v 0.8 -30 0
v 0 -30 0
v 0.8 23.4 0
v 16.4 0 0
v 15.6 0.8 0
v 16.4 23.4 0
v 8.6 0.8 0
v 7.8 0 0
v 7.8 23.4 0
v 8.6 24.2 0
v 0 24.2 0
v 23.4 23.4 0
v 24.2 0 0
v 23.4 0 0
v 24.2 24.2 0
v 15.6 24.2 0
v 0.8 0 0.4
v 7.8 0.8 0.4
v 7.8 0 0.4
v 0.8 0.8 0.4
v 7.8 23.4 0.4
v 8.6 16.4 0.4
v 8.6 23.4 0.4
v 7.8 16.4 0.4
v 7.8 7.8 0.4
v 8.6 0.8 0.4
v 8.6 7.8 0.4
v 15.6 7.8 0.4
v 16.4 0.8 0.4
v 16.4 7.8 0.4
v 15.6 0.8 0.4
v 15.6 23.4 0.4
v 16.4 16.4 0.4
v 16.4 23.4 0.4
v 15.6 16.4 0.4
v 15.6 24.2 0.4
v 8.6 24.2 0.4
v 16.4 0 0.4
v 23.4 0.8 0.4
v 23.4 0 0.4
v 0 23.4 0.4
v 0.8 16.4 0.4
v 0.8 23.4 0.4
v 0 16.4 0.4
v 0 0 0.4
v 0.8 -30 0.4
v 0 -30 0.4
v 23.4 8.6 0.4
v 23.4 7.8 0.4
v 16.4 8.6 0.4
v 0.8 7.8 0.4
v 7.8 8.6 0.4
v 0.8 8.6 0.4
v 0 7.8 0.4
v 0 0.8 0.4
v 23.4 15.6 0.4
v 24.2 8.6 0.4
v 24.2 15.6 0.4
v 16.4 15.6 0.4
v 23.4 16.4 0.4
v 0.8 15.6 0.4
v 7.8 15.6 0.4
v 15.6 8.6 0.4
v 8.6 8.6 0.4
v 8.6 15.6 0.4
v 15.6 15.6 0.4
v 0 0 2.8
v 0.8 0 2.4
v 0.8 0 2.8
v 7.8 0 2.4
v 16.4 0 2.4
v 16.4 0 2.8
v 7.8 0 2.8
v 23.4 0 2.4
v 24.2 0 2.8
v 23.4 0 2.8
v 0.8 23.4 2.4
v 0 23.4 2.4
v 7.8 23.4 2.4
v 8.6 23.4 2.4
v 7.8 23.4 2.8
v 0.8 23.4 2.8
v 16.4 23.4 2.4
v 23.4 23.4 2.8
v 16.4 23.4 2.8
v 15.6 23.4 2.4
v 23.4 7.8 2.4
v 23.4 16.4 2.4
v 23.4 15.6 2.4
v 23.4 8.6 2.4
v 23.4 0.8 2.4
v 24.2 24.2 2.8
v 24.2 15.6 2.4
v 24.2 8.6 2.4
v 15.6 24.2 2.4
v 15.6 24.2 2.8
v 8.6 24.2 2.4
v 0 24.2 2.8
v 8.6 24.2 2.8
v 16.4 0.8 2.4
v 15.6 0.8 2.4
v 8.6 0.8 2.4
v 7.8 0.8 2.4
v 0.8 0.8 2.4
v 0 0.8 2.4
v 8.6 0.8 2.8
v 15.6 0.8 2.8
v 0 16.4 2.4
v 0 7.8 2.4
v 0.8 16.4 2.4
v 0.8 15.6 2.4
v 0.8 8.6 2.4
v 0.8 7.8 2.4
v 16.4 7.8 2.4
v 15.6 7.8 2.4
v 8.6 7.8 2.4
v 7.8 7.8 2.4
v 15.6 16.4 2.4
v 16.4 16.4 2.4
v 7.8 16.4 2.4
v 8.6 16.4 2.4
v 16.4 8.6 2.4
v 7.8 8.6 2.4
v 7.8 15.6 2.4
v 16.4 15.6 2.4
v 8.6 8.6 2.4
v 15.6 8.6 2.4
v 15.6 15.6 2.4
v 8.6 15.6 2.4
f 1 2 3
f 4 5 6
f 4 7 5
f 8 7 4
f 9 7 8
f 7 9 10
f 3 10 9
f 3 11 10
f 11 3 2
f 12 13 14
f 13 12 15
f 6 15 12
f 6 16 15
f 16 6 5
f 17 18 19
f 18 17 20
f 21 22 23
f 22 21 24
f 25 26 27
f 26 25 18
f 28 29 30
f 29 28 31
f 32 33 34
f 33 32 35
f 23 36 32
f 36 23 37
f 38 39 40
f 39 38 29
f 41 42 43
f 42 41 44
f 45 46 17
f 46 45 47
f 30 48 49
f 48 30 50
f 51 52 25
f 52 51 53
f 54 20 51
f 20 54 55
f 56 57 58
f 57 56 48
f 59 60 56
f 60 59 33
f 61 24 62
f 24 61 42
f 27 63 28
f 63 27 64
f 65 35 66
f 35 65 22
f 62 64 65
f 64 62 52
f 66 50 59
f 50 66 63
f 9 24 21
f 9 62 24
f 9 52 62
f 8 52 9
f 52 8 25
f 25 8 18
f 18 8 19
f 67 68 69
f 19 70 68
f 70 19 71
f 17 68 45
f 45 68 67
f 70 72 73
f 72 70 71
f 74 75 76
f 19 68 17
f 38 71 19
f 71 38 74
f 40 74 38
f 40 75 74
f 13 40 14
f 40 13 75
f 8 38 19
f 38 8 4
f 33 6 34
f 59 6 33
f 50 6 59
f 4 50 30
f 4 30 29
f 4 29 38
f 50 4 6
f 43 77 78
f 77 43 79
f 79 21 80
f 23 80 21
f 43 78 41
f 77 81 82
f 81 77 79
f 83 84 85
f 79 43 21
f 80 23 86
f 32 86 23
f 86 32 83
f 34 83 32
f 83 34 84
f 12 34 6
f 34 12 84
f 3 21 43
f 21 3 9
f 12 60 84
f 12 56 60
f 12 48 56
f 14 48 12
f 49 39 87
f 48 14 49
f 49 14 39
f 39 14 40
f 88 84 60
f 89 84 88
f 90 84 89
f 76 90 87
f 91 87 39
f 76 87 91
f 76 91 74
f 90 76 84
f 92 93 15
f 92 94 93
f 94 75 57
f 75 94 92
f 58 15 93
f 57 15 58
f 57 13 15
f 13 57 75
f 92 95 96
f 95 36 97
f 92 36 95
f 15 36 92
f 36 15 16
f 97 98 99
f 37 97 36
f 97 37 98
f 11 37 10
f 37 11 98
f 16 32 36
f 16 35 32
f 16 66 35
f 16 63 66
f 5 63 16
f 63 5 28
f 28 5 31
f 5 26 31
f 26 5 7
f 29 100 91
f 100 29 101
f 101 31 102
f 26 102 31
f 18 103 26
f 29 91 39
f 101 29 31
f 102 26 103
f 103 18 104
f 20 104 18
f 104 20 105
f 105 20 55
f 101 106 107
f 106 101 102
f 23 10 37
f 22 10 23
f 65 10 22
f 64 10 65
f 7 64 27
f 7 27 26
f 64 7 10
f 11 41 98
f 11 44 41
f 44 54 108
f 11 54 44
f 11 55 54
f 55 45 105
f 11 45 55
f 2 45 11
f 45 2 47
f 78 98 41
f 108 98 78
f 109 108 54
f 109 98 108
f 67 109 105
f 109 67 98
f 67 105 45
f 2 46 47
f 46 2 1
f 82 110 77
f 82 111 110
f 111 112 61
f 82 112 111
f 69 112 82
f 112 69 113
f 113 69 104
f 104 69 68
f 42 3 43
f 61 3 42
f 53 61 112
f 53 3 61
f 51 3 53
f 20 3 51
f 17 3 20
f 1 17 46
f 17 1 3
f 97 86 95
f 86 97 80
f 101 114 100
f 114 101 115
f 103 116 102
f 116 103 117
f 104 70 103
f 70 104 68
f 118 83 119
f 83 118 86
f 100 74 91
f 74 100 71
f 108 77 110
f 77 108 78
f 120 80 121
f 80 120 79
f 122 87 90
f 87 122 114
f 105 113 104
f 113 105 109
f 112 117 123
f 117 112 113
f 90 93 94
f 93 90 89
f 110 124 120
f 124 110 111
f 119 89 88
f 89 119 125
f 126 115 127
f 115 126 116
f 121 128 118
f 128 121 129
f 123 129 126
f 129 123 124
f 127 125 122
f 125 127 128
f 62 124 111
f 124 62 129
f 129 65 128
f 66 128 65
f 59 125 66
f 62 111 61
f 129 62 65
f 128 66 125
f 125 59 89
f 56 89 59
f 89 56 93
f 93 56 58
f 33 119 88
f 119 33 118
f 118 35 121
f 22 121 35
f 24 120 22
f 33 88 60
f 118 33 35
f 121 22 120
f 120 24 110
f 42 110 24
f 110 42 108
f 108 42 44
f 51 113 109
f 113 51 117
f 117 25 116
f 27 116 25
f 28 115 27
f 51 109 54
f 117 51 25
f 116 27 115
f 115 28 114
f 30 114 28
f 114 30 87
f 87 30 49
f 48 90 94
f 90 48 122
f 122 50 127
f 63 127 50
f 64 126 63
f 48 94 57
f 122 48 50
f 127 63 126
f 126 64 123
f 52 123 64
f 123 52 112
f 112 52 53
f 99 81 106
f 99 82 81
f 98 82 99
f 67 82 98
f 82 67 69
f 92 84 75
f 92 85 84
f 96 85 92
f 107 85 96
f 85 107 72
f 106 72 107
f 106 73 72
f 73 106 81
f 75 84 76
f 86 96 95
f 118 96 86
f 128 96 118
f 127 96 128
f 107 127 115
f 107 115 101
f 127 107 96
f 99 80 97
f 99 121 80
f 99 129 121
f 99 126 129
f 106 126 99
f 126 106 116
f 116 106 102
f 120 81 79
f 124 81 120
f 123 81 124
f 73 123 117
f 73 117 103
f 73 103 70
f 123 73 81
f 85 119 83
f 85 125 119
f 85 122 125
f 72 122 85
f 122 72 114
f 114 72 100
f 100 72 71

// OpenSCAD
// file: ../../api/v3/reporting.scad
//////////////////////////////////////////////////////////////////////
// LibFile: reporting.scad
// Project: Grid Stack
// FileGroup: API v3 Reporting
// FileSummary: Console report for immutable direct and positive-gap coupons.
// Role: Records the exact environment, dimensions, support strategy, path
//       lengths, qualification status, and deposited-layer counts.
// Requires: API v3 indexes, mathematics, and path generator.
// Exports: report_structural_coupon_object().
//////////////////////////////////////////////////////////////////////

function _bridge_status3(span, process) =
    span <= process[PX3_BRIDGE_MAX]
        ? "within_owner_tested_limit"
        : "exploratory_beyond_owner_tested_limit";

module report_structural_coupon_object(object, report_level = "full") {
    material = object[SCO_MATERIAL];
    nozzle = object[SCO_NOZZLE];
    printer = object[SCO_PRINTER];
    process = object[SCO_PROCESS];
    boundary = object[SCO_BOUNDARY];
    gap = object[SCO_CLEAR_GAP];
    strategy = object[SCO_SUPPORT_STRATEGY];

    echo("--- Grid Stack immutable structural coupon ---");
    echo(str("Object: ", object[SCO_NAME], " revision ", object[SCO_REVISION]));
    echo(str("API/schema: ", object[SCO_REQUIRED_API], "/",
        object[SCO_SCHEMA_VERSION]));
    echo(str("Release/base commit: ", object[SCO_SOURCE_RELEASE], " / ",
        object[SCO_FRAMEWORK_BASE_COMMIT]));
    echo(str("Material/nozzle/printer: ", material[MAT3_FAMILY], " / ",
        nozzle[NZ3_DIAMETER], " mm / ", printer[PRN3_NAME]));
    echo(str("Cells: ", boundary[B3_CELLS_X], " x ", boundary[B3_CELLS_Y]));
    echo(str("Clear spans: ", boundary[B3_CLEAR_SPAN_X], " x ",
        boundary[B3_CLEAR_SPAN_Y], " mm"));
    echo(str("Span status: ",
        _bridge_status3(boundary[B3_CLEAR_SPAN_X], process)));
    echo(str("Outside size: ", boundary_size_x3(boundary, process, nozzle),
        " x ", boundary_size_y3(boundary, process, nozzle), " mm"));
    echo(str("Primitive trace: ", trace_width3(nozzle), " x ",
        trace_height3(process), " mm"));
    echo(str("Structural strand: ", strand_width3(process, nozzle), " x ",
        strand_height3(process), " mm"));
    echo(str("Clear vertical gap: ", gap, " mm"));
    echo(str("Support strategy: ", strategy));
    echo(str("Total modeled height: ", coupon_total_height3(object), " mm"));

    if (report_level == "full") {
        if (strategy == "direct_orthogonal") {
            lower = coupon_path(
                boundary, process, nozzle, 0, object[SCO_LEAD_IN]
            );
            upper = coupon_path(boundary, process, nozzle, 90, 0);
            echo(str("Lower/upper path lengths: ", path_length3(lower),
                " / ", path_length3(upper), " mm"));
            echo(str("Deposited layers: ", 2 * process[PX3_HEIGHT_PASSES]));
        }
        else {
            witness = coupon_path(
                boundary, process, nozzle, 90, object[SCO_LEAD_IN]
            );
            riser = coupon_path(boundary, process, nozzle, 0, 0);
            test = coupon_path(boundary, process, nozzle, 90, 0);
            echo(str("Witness/riser/test path lengths: ",
                path_length3(witness), " / ", path_length3(riser), " / ",
                path_length3(test), " mm"));
            echo(str("Riser deposited layers: ", round(gap_layer_count3(object))));
            echo(str("Total deposited layers: ",
                2 * process[PX3_HEIGHT_PASSES] +
                round(gap_layer_count3(object))));
        }
        echo(str("Status: ", object[SCO_STATUS]));
        echo(str("Notes: ", object[SCO_NOTES]));
    }
}
// file: ../../api/v3/validation.scad
//////////////////////////////////////////////////////////////////////
// LibFile: validation.scad
// Project: Grid Stack
// FileGroup: API v3 Validation
// FileSummary: Validates immutable environment records, count boundaries,
//              support strategy, path continuity, and layer quantization.
// Role: Rejects incompatible or physically floating recipes before geometry
//       is generated.
// Requires: API v3 indexes, mathematics, and path generator.
// Exports: validate_structural_coupon_object().
//////////////////////////////////////////////////////////////////////

module _validate_path3(points, boundary, orientation, lead_in) {
    run_count = orientation == 0
        ? boundary_strand_count_y3(boundary)
        : boundary_strand_count_x3(boundary);

    assert(len(points) == expected_coupon_point_count3(run_count, lead_in),
        "API v3 coupon path has an unexpected point count.");
    assert(!path_has_zero_segment3(points),
        "API v3 coupon path contains a zero-length segment.");
    assert(path_axis_aligned3(points),
        "API v3 coupon path must remain axis-aligned.");
    assert(points[0] != points[len(points) - 1],
        "API v3 coupon path must remain open.");
}

module validate_structural_coupon_object(object) {
    assert(object[SCO_REQUIRED_API] == GRID_STACK_API_VERSION,
        "Saved coupon requires a different Grid Stack API version.");
    assert(object[SCO_SCHEMA_VERSION] == GRID_STACK_COUPON_SCHEMA_VERSION,
        "Saved coupon requires a different coupon schema version.");
    assert(GRID_STACK_RECTANGULAR_FRAMEWORK_VERSION == 2,
        "Saved coupon requires rectangular framework version 2.");

    material = object[SCO_MATERIAL];
    nozzle = object[SCO_NOZZLE];
    printer = object[SCO_PRINTER];
    process = object[SCO_PROCESS];
    boundary = object[SCO_BOUNDARY];
    gap = object[SCO_CLEAR_GAP];
    lead_in = object[SCO_LEAD_IN];
    strategy = object[SCO_SUPPORT_STRATEGY];

    assert(nozzle[NZ3_DIAMETER] > 0,
        "Saved coupon nozzle diameter must be positive.");
    assert(process[PX3_LAYER_H] > 0,
        "Saved coupon layer height must be positive.");
    assert(process[PX3_WIDTH_PASSES] >= 2,
        "Saved coupon structural width requires at least two passes.");
    assert(process[PX3_HEIGHT_PASSES] >= 2,
        "Saved coupon structural height requires at least two layers.");
    assert(process[PX3_MATERIAL] == material[MAT3_NAME],
        "Saved coupon process/material references do not match.");
    assert(process[PX3_NOZZLE] == nozzle[NZ3_NAME],
        "Saved coupon process/nozzle references do not match.");
    assert(process[PX3_PRINTER] == printer[PRN3_NAME],
        "Saved coupon process/printer references do not match.");
    assert(boundary[B3_CELLS_X] > 0 && boundary[B3_CELLS_Y] > 0,
        "Saved coupon cell counts must be positive.");
    assert(boundary[B3_CLEAR_SPAN_X] > 0 &&
           boundary[B3_CLEAR_SPAN_Y] > 0,
        "Saved coupon clear spans must be positive.");
    assert(lead_in >= 0,
        "Saved coupon lead-in cannot be negative.");
    assert(gap >= 0,
        "Saved coupon clear gap cannot be negative.");
    assert(nearly_equal3(gap_layer_count3(object), round(gap_layer_count3(object))),
        "Saved coupon clear gap must equal a whole deposited-layer count.");
    assert(
        (strategy == "direct_orthogonal" && nearly_equal3(gap, 0)) ||
        (strategy == "witness_riser_bridge" && gap > 0),
        "Saved coupon support strategy does not match its clear gap."
    );

    if (strategy == "direct_orthogonal") {
        lower = coupon_path(boundary, process, nozzle, 0, lead_in);
        upper = coupon_path(boundary, process, nozzle, 90, 0);
        _validate_path3(lower, boundary, 0, lead_in);
        _validate_path3(upper, boundary, 90, 0);
        entry = lead_in > 0 ? 1 : 0;
        assert(nearly_equal3(point_distance_2d3(lower[entry], upper[0]), 0),
            "Direct upper path must start on the lower entry crossing.");
    }
    else {
        witness = coupon_path(boundary, process, nozzle, 90, lead_in);
        riser = coupon_path(boundary, process, nozzle, 0, 0);
        test = coupon_path(boundary, process, nozzle, 90, 0);
        _validate_path3(witness, boundary, 90, lead_in);
        _validate_path3(riser, boundary, 0, 0);
        _validate_path3(test, boundary, 90, 0);
        entry = lead_in > 0 ? 1 : 0;
        assert(nearly_equal3(point_distance_2d3(witness[entry], riser[0]), 0),
            "Riser path must start on the witness entry crossing.");
        assert(nearly_equal3(point_distance_2d3(riser[0], test[0]), 0),
            "Upper test path must start on the riser entry crossing.");
        for (i = [0 : len(test) - 1])
            assert(nearly_equal3(point_distance_2d3(test[i], witness[i + entry]), 0),
                "Upper test path must align directly above the witness path.");
    }

    echo("GRID STACK API V3 COUPON VALIDATION: PASS");
}
// file: ../../api/v3/geometry.scad
//////////////////////////////////////////////////////////////////////
// LibFile: geometry.scad
// Project: Grid Stack
// FileGroup: API v3 Printable Geometry
// FileSummary: Creates square-ended structural paths, direct-contact coupons,
//              positive witness/riser/bridge coupons, and simple diagnostics.
// Role: Supplies all geometry used by immutable API v3 recipes without
//       importing mutable workbench geometry.
// Requires: API v3 mathematics and ordered axis-aligned paths.
// Exports: render_direct_coupon(), render_positive_gap_coupon(), and
//          render_coupon_path_debug().
//////////////////////////////////////////////////////////////////////

module _segment_2d3(a, b, width) {
    horizontal = nearly_equal3(a[1], b[1]);
    vertical = nearly_equal3(a[0], b[0]);

    assert(horizontal || vertical,
        "API v3 printable segments must be horizontal or vertical.");
    assert(!nearly_equal3(point_distance_2d3(a, b), 0),
        "API v3 printable segments must have nonzero length.");

    if (horizontal)
        translate([min(a[0], b[0]) - width / 2, a[1] - width / 2])
            square([abs(b[0] - a[0]) + width, width]);
    else
        translate([a[0] - width / 2, min(a[1], b[1]) - width / 2])
            square([width, abs(b[1] - a[1]) + width]);
}

module _path_2d3(points, width) {
    union()
        for (i = [0 : len(points) - 2])
            _segment_2d3(points[i], points[i + 1], width);
}

module _structural_path3(points, process, nozzle) {
    linear_extrude(height = strand_height3(process), convexity = 10)
        _path_2d3(points, strand_width3(process, nozzle));
}

module render_direct_coupon(lower, upper, process, nozzle) {
    union() {
        _structural_path3(lower, process, nozzle);
        translate([0, 0, strand_height3(process)])
            _structural_path3(upper, process, nozzle);
    }
}

module render_positive_gap_coupon(
    witness, riser, test, process, nozzle, clear_gap
) {
    union() {
        _structural_path3(witness, process, nozzle);

        translate([0, 0, strand_height3(process)])
            linear_extrude(height = clear_gap, convexity = 10)
                _path_2d3(riser, strand_width3(process, nozzle));

        translate([0, 0, strand_height3(process) + clear_gap])
            _structural_path3(test, process, nozzle);
    }
}

module _debug_path3(points, z, width) {
    translate([0, 0, z])
        linear_extrude(height = 0.04)
            _path_2d3(points, width);
}

module render_coupon_path_debug(
    lower, upper, riser, process, clear_gap = 0
) {
    width = max(0.12, trace_height3(process));
    _debug_path3(lower, 0, width);
    if (len(riser) > 0)
        _debug_path3(riser, strand_height3(process), width);
    _debug_path3(
        upper,
        strand_height3(process) + clear_gap,
        width
    );
}
// file: ../../api/v3/paths.scad
//////////////////////////////////////////////////////////////////////
// LibFile: paths.scad
// Project: Grid Stack
// FileGroup: API v3 Path Generation
// FileSummary: Generates one open rectangular serpentine centerline from a
//              count boundary for X- or Y-running structural paths.
// Role: Preserves parallel runs, square connectors, optional single lead-in,
//       and one uninterrupted ordered point list per deposited layer.
// Requires: API v3 indexes and mathematics.
// Exports: coupon_path() and expected_coupon_point_count3().
//////////////////////////////////////////////////////////////////////

function _x_rows3(row, count, x_min, x_max, y_min, pitch) =
    row >= count
        ? []
        : let(
            y = y_min + row * pitch,
            x_end = row % 2 == 0 ? x_max : x_min,
            row_end = [x_end, y],
            connector_end = [x_end, y + pitch]
        )
        concat(
            [row_end],
            row < count - 1 ? [connector_end] : [],
            _x_rows3(row + 1, count, x_min, x_max, y_min, pitch)
        );

function _y_columns3(column, count, x_min, y_min, y_max, pitch) =
    column >= count
        ? []
        : let(
            x = x_min + column * pitch,
            y_end = column % 2 == 0 ? y_max : y_min,
            column_end = [x, y_end],
            connector_end = [x + pitch, y_end]
        )
        concat(
            [column_end],
            column < count - 1 ? [connector_end] : [],
            _y_columns3(column + 1, count, x_min, y_min, y_max, pitch)
        );

function expected_coupon_point_count3(run_count, lead_in = 0) =
    2 * run_count + (lead_in > 0 ? 1 : 0);

function coupon_path(
    boundary, process, nozzle, orientation = 0, lead_in = 0
) =
    assert(orientation == 0 || orientation == 90,
        "API v3 coupon orientation must be 0 or 90 degrees.")
    assert(lead_in >= 0,
        "API v3 coupon lead-in cannot be negative.")
    let(
        width = strand_width3(process, nozzle),
        x_min = width / 2,
        y_min = width / 2,
        x_max = boundary_size_x3(boundary, process, nozzle) - width / 2,
        y_max = boundary_size_y3(boundary, process, nozzle) - width / 2,
        entry = [x_min, y_min],
        prefix = lead_in > 0
            ? (orientation == 0
                ? [[x_min - lead_in, y_min], entry]
                : [[x_min, y_min - lead_in], entry])
            : [entry]
    )
    orientation == 0
        ? concat(
            prefix,
            _x_rows3(
                0, boundary_strand_count_y3(boundary),
                x_min, x_max, y_min,
                boundary_pitch_y3(boundary, process, nozzle)
            )
        )
        : concat(
            prefix,
            _y_columns3(
                0, boundary_strand_count_x3(boundary),
                x_min, y_min, y_max,
                boundary_pitch_x3(boundary, process, nozzle)
            )
        );
// file: ../../api/v3/math.scad
//////////////////////////////////////////////////////////////////////
// LibFile: math.scad
// Project: Grid Stack
// FileGroup: API v3 Mathematics
// FileSummary: Pure trace, strand, boundary, path, and layer-count helpers.
// Role: Keeps API v3 calculations isolated and reproducible without importing
//       mutable workbench mathematics.
// Requires: API v3 indexes.
// Exports: nearly_equal3(), trace/strand dimensions, boundary dimensions,
//          path inspection, gap-layer count, and total-height helpers.
//////////////////////////////////////////////////////////////////////

function nearly_equal3(a, b, epsilon = 0.000001) = abs(a - b) <= epsilon;

function trace_width3(nozzle) = nozzle[NZ3_DIAMETER];
function trace_height3(process) = process[PX3_LAYER_H];
function strand_width3(process, nozzle) =
    trace_width3(nozzle) * process[PX3_WIDTH_PASSES];
function strand_height3(process) =
    trace_height3(process) * process[PX3_HEIGHT_PASSES];

function boundary_strand_count_x3(boundary) = boundary[B3_CELLS_X] + 1;
function boundary_strand_count_y3(boundary) = boundary[B3_CELLS_Y] + 1;
function boundary_pitch_x3(boundary, process, nozzle) =
    boundary[B3_CLEAR_SPAN_X] + strand_width3(process, nozzle);
function boundary_pitch_y3(boundary, process, nozzle) =
    boundary[B3_CLEAR_SPAN_Y] + strand_width3(process, nozzle);
function boundary_size_x3(boundary, process, nozzle) =
    boundary[B3_CELLS_X] * boundary[B3_CLEAR_SPAN_X] +
    boundary_strand_count_x3(boundary) * strand_width3(process, nozzle);
function boundary_size_y3(boundary, process, nozzle) =
    boundary[B3_CELLS_Y] * boundary[B3_CLEAR_SPAN_Y] +
    boundary_strand_count_y3(boundary) * strand_width3(process, nozzle);

function point_distance_2d3(a, b) =
    sqrt(pow(b[0] - a[0], 2) + pow(b[1] - a[1], 2));
function path_length3(points, i = 0) =
    i >= len(points) - 1
        ? 0
        : point_distance_2d3(points[i], points[i + 1]) +
          path_length3(points, i + 1);
function path_has_zero_segment3(points, i = 0) =
    i >= len(points) - 1
        ? false
        : nearly_equal3(point_distance_2d3(points[i], points[i + 1]), 0)
            ? true
            : path_has_zero_segment3(points, i + 1);
function segment_axis_aligned3(a, b) =
    nearly_equal3(a[0], b[0]) || nearly_equal3(a[1], b[1]);
function path_axis_aligned3(points, i = 0) =
    i >= len(points) - 1
        ? true
        : segment_axis_aligned3(points[i], points[i + 1]) &&
          path_axis_aligned3(points, i + 1);

function gap_layer_count3(object) =
    object[SCO_CLEAR_GAP] / trace_height3(object[SCO_PROCESS]);
function coupon_total_height3(object) =
    2 * strand_height3(object[SCO_PROCESS]) + object[SCO_CLEAR_GAP];
// file: ../../api/v3/schema.scad
//////////////////////////////////////////////////////////////////////
// LibFile: schema.scad
// Project: Grid Stack
// FileGroup: API v3 Data Model
// FileSummary: Constructors for self-contained immutable structural coupons.
// Role: Makes every geometry-affecting environment and object value explicit
//       inside the saved recipe rather than resolving mutable catalog names.
// Exports: material_spec(), nozzle_spec(), printer_spec(),
//          structural_process_profile(), count_boundary(), and
//          structural_coupon_object().
//////////////////////////////////////////////////////////////////////

function material_spec(
    name, family, flexibility, status = "in_use", notes = ""
) = [name, family, flexibility, status, notes];

function nozzle_spec(
    name, diameter, construction = "brass", status = "in_use", notes = ""
) = [name, diameter, construction, status, notes];

function printer_spec(
    name,
    manufacturer = "",
    model = "",
    motion_system = "",
    build_surface = "",
    status = "unrecorded",
    notes = ""
) = [
    name, manufacturer, model, motion_system,
    build_surface, status, notes
];

function structural_process_profile(
    name,
    material_name,
    nozzle_name,
    printer_name,
    layer_height,
    width_passes,
    height_passes,
    bridge_max,
    qualification,
    revision,
    notes = ""
) = [
    name, material_name, nozzle_name, printer_name,
    layer_height, width_passes, height_passes, bridge_max,
    qualification, revision, notes
];

// Function: count_boundary()
// Synopsis: Stores clear-opening counts and clear spans for one rectangle.
function count_boundary(
    name,
    cells_x,
    cells_y,
    clear_span_x,
    clear_span_y,
    notes = ""
) = [name, cells_x, cells_y, clear_span_x, clear_span_y, notes];

// Function: structural_coupon_object()
// Synopsis: Constructs one permanent coupon recipe.
// Description:
//   framework_base_commit records the last accepted repository state used to
//   begin the API implementation. The Git commit containing this recipe is the
//   authoritative complete source; a file cannot embed its own future hash.
function structural_coupon_object(
    name,
    revision,
    required_api_version,
    coupon_schema_version,
    source_release,
    framework_base_commit,
    material,
    nozzle,
    printer,
    process,
    boundary,
    clear_vertical_gap,
    lead_in,
    support_strategy,
    status = "calibration",
    notes = ""
) = [
    name,
    revision,
    required_api_version,
    coupon_schema_version,
    source_release,
    framework_base_commit,
    material,
    nozzle,
    printer,
    process,
    boundary,
    clear_vertical_gap,
    lead_in,
    support_strategy,
    status,
    notes
];
// file: ../../api/v3/indices.scad
//////////////////////////////////////////////////////////////////////
// LibFile: indices.scad
// Project: Grid Stack
// FileGroup: API v3 Data Model
// FileSummary: Named indexes for immutable structural-coupon records.
// Role: Prevents unexplained numeric indexes from entering saved recipes and
//       keeps API version 3 independent of mutable workbench indexes.
// Exports: MAT3_*, NZ3_*, PRN3_*, PX3_*, B3_*, and SCO_* constants.
//////////////////////////////////////////////////////////////////////

MAT3_NAME = 0;
MAT3_FAMILY = 1;
MAT3_FLEXIBILITY = 2;
MAT3_STATUS = 3;
MAT3_NOTES = 4;

NZ3_NAME = 0;
NZ3_DIAMETER = 1;
NZ3_CONSTRUCTION = 2;
NZ3_STATUS = 3;
NZ3_NOTES = 4;

PRN3_NAME = 0;
PRN3_MANUFACTURER = 1;
PRN3_MODEL = 2;
PRN3_MOTION_SYSTEM = 3;
PRN3_BUILD_SURFACE = 4;
PRN3_STATUS = 5;
PRN3_NOTES = 6;

PX3_NAME = 0;
PX3_MATERIAL = 1;
PX3_NOZZLE = 2;
PX3_PRINTER = 3;
PX3_LAYER_H = 4;
PX3_WIDTH_PASSES = 5;
PX3_HEIGHT_PASSES = 6;
PX3_BRIDGE_MAX = 7;
PX3_QUALIFICATION = 8;
PX3_REVISION = 9;
PX3_NOTES = 10;

B3_NAME = 0;
B3_CELLS_X = 1;
B3_CELLS_Y = 2;
B3_CLEAR_SPAN_X = 3;
B3_CLEAR_SPAN_Y = 4;
B3_NOTES = 5;

SCO_NAME = 0;
SCO_REVISION = 1;
SCO_REQUIRED_API = 2;
SCO_SCHEMA_VERSION = 3;
SCO_SOURCE_RELEASE = 4;
SCO_FRAMEWORK_BASE_COMMIT = 5;
SCO_MATERIAL = 6;
SCO_NOZZLE = 7;
SCO_PRINTER = 8;
SCO_PROCESS = 9;
SCO_BOUNDARY = 10;
SCO_CLEAR_GAP = 11;
SCO_LEAD_IN = 12;
SCO_SUPPORT_STRATEGY = 13;
SCO_STATUS = 14;
SCO_NOTES = 15;
// file: ../../api/grid_stack_v3.scad
//////////////////////////////////////////////////////////////////////
// LibFile: grid_stack_v3.scad
// Project: Grid Stack
// FileGroup: Versioned Public Interface
// FileSummary: Immutable API version 3 for rectangular count-boundary
//              structural coupons, including positive witness/riser gaps.
// Role: Reconstructs saved coupon recipes without Customizer state or mutable
//       workbench catalogs. Incompatible behavior requires a new API file.
// Exports: API/schema constants, record constructors, validation, reporting,
//          and structural_coupon_render().
//////////////////////////////////////////////////////////////////////

GRID_STACK_API_VERSION = 3;
GRID_STACK_COUPON_SCHEMA_VERSION = 1;
GRID_STACK_RECTANGULAR_FRAMEWORK_VERSION = 2;
GRID_STACK_RELEASE = "1.0.0";

include <v3/indices.scad>
include <v3/schema.scad>
include <v3/math.scad>
include <v3/paths.scad>
include <v3/geometry.scad>
include <v3/validation.scad>
include <v3/reporting.scad>

// Module: structural_coupon_render()
// Synopsis: Validates, reports, and renders one immutable coupon recipe.
// Arguments:
//   object = Record returned by structural_coupon_object().
//   mode = print, path_debug, or report_only.
//   report_level = summary or full.
module structural_coupon_render(
    object,
    mode = "print",
    report_level = "full"
) {
    validate_structural_coupon_object(object);
    report_structural_coupon_object(object, report_level);

    boundary = object[SCO_BOUNDARY];
    process = object[SCO_PROCESS];
    nozzle = object[SCO_NOZZLE];
    lead_in = object[SCO_LEAD_IN];
    clear_gap = object[SCO_CLEAR_GAP];
    strategy = object[SCO_SUPPORT_STRATEGY];

    if (strategy == "direct_orthogonal") {
        lower = coupon_path(boundary, process, nozzle, 0, lead_in);
        upper = coupon_path(boundary, process, nozzle, 90, 0);

        if (mode == "print")
            render_direct_coupon(lower, upper, process, nozzle);
        else if (mode == "path_debug")
            render_coupon_path_debug(lower, upper, [], process);
        else if (mode == "report_only")
            echo("Grid Stack API v3 report-only mode: no geometry generated.");
        else
            assert(false, str("Unknown API v3 render mode: ", mode));
    }
    else if (strategy == "witness_riser_bridge") {
        witness = coupon_path(boundary, process, nozzle, 90, lead_in);
        riser = coupon_path(boundary, process, nozzle, 0, 0);
        test = coupon_path(boundary, process, nozzle, 90, 0);

        if (mode == "print")
            render_positive_gap_coupon(
                witness, riser, test, process, nozzle, clear_gap
            );
        else if (mode == "path_debug")
            render_coupon_path_debug(witness, test, riser, process, clear_gap);
        else if (mode == "report_only")
            echo("Grid Stack API v3 report-only mode: no geometry generated.");
        else
            assert(false, str("Unknown API v3 render mode: ", mode));
    }
    else
        assert(false, str("Unknown coupon support strategy: ", strategy));
}
// main file
//////////////////////////////////////////////////////////////////////
// LibFile: coupon-3x3-span7-gap2-pla-plus-0p4-v1.scad
// Project: Grid Stack
// FileGroup: Immutable Structural Coupon
// FileSummary: 3 x 3 PLA+ coupon with 7 mm clear XY spans and 2 mm
//              clear vertical gap using witness_riser_bridge geometry.
// Role: Permanently reconstructs one calibration object without Customizer
//       state or mutable workbench catalog lookup.
// FrameworkBaseCommit: 4b5e564
// Requires: Grid Stack API version 3 and coupon schema version 1.
// Output: Printable continuous-path structural coupon geometry.
//////////////////////////////////////////////////////////////////////

include <../../api/grid_stack_v3.scad>

assert(GRID_STACK_API_VERSION == 3,
    "This recipe requires Grid Stack API version 3.");
assert(GRID_STACK_COUPON_SCHEMA_VERSION == 1,
    "This recipe requires coupon schema version 1.");
assert(GRID_STACK_RECTANGULAR_FRAMEWORK_VERSION == 2,
    "This recipe requires rectangular framework version 2.");

saved_material = material_spec(
    name = "PLA_PLUS",
    family = "PLA+",
    flexibility = "rigid",
    status = "in_use",
    notes = "Exact material family selected for the coupon matrix."
);

saved_nozzle = nozzle_spec(
    name = "BRASS_0P4",
    diameter = 0.4,
    construction = "brass",
    status = "in_use",
    notes = "Nominal nozzle diameter used to derive the 0.8 mm strand width."
);

saved_printer = printer_spec(
    name = "UNRECORDED_PRINTER_R1",
    manufacturer = "",
    model = "",
    motion_system = "",
    build_surface = "",
    status = "unrecorded",
    notes = "Printer identity was not frozen with this coupon framework."
);

saved_process = structural_process_profile(
    name = "PLA_PLUS_0P4_LH0P2_W2_H2_R1",
    material_name = "PLA_PLUS",
    nozzle_name = "BRASS_0P4",
    printer_name = "UNRECORDED_PRINTER_R1",
    layer_height = 0.2,
    width_passes = 2,
    height_passes = 2,
    bridge_max = 6,
    qualification = "owner_tested_to_6mm",
    revision = 1,
    notes = "Primitive trace 0.4 x 0.2 mm; structural strand 0.8 x 0.4 mm."
);

saved_boundary = count_boundary(
    name = "COUNT_3X3_SPAN7",
    cells_x = 3,
    cells_y = 3,
    clear_span_x = 7,
    clear_span_y = 7,
    notes = "Outside dimensions derive from four strands and three clear openings."
);

saved_coupon = structural_coupon_object(
    name = "COUPON_3X3_SPAN7_GAP2_PLA_PLUS_0P4_V1",
    revision = 1,
    required_api_version = 3,
    coupon_schema_version = 1,
    source_release = "1.0.0",
    framework_base_commit = "4b5e564",
    material = saved_material,
    nozzle = saved_nozzle,
    printer = saved_printer,
    process = saved_process,
    boundary = saved_boundary,
    clear_vertical_gap = 2,
    lead_in = 30,
    support_strategy = "witness_riser_bridge",
    status = "calibration_unprinted",
    notes = "Calibration recipe generated from the frozen Batch 010 framework; record results in a new revision after printing."
);

structural_coupon_render(
    saved_coupon,
    mode = "print",
    report_level = "full"
);
